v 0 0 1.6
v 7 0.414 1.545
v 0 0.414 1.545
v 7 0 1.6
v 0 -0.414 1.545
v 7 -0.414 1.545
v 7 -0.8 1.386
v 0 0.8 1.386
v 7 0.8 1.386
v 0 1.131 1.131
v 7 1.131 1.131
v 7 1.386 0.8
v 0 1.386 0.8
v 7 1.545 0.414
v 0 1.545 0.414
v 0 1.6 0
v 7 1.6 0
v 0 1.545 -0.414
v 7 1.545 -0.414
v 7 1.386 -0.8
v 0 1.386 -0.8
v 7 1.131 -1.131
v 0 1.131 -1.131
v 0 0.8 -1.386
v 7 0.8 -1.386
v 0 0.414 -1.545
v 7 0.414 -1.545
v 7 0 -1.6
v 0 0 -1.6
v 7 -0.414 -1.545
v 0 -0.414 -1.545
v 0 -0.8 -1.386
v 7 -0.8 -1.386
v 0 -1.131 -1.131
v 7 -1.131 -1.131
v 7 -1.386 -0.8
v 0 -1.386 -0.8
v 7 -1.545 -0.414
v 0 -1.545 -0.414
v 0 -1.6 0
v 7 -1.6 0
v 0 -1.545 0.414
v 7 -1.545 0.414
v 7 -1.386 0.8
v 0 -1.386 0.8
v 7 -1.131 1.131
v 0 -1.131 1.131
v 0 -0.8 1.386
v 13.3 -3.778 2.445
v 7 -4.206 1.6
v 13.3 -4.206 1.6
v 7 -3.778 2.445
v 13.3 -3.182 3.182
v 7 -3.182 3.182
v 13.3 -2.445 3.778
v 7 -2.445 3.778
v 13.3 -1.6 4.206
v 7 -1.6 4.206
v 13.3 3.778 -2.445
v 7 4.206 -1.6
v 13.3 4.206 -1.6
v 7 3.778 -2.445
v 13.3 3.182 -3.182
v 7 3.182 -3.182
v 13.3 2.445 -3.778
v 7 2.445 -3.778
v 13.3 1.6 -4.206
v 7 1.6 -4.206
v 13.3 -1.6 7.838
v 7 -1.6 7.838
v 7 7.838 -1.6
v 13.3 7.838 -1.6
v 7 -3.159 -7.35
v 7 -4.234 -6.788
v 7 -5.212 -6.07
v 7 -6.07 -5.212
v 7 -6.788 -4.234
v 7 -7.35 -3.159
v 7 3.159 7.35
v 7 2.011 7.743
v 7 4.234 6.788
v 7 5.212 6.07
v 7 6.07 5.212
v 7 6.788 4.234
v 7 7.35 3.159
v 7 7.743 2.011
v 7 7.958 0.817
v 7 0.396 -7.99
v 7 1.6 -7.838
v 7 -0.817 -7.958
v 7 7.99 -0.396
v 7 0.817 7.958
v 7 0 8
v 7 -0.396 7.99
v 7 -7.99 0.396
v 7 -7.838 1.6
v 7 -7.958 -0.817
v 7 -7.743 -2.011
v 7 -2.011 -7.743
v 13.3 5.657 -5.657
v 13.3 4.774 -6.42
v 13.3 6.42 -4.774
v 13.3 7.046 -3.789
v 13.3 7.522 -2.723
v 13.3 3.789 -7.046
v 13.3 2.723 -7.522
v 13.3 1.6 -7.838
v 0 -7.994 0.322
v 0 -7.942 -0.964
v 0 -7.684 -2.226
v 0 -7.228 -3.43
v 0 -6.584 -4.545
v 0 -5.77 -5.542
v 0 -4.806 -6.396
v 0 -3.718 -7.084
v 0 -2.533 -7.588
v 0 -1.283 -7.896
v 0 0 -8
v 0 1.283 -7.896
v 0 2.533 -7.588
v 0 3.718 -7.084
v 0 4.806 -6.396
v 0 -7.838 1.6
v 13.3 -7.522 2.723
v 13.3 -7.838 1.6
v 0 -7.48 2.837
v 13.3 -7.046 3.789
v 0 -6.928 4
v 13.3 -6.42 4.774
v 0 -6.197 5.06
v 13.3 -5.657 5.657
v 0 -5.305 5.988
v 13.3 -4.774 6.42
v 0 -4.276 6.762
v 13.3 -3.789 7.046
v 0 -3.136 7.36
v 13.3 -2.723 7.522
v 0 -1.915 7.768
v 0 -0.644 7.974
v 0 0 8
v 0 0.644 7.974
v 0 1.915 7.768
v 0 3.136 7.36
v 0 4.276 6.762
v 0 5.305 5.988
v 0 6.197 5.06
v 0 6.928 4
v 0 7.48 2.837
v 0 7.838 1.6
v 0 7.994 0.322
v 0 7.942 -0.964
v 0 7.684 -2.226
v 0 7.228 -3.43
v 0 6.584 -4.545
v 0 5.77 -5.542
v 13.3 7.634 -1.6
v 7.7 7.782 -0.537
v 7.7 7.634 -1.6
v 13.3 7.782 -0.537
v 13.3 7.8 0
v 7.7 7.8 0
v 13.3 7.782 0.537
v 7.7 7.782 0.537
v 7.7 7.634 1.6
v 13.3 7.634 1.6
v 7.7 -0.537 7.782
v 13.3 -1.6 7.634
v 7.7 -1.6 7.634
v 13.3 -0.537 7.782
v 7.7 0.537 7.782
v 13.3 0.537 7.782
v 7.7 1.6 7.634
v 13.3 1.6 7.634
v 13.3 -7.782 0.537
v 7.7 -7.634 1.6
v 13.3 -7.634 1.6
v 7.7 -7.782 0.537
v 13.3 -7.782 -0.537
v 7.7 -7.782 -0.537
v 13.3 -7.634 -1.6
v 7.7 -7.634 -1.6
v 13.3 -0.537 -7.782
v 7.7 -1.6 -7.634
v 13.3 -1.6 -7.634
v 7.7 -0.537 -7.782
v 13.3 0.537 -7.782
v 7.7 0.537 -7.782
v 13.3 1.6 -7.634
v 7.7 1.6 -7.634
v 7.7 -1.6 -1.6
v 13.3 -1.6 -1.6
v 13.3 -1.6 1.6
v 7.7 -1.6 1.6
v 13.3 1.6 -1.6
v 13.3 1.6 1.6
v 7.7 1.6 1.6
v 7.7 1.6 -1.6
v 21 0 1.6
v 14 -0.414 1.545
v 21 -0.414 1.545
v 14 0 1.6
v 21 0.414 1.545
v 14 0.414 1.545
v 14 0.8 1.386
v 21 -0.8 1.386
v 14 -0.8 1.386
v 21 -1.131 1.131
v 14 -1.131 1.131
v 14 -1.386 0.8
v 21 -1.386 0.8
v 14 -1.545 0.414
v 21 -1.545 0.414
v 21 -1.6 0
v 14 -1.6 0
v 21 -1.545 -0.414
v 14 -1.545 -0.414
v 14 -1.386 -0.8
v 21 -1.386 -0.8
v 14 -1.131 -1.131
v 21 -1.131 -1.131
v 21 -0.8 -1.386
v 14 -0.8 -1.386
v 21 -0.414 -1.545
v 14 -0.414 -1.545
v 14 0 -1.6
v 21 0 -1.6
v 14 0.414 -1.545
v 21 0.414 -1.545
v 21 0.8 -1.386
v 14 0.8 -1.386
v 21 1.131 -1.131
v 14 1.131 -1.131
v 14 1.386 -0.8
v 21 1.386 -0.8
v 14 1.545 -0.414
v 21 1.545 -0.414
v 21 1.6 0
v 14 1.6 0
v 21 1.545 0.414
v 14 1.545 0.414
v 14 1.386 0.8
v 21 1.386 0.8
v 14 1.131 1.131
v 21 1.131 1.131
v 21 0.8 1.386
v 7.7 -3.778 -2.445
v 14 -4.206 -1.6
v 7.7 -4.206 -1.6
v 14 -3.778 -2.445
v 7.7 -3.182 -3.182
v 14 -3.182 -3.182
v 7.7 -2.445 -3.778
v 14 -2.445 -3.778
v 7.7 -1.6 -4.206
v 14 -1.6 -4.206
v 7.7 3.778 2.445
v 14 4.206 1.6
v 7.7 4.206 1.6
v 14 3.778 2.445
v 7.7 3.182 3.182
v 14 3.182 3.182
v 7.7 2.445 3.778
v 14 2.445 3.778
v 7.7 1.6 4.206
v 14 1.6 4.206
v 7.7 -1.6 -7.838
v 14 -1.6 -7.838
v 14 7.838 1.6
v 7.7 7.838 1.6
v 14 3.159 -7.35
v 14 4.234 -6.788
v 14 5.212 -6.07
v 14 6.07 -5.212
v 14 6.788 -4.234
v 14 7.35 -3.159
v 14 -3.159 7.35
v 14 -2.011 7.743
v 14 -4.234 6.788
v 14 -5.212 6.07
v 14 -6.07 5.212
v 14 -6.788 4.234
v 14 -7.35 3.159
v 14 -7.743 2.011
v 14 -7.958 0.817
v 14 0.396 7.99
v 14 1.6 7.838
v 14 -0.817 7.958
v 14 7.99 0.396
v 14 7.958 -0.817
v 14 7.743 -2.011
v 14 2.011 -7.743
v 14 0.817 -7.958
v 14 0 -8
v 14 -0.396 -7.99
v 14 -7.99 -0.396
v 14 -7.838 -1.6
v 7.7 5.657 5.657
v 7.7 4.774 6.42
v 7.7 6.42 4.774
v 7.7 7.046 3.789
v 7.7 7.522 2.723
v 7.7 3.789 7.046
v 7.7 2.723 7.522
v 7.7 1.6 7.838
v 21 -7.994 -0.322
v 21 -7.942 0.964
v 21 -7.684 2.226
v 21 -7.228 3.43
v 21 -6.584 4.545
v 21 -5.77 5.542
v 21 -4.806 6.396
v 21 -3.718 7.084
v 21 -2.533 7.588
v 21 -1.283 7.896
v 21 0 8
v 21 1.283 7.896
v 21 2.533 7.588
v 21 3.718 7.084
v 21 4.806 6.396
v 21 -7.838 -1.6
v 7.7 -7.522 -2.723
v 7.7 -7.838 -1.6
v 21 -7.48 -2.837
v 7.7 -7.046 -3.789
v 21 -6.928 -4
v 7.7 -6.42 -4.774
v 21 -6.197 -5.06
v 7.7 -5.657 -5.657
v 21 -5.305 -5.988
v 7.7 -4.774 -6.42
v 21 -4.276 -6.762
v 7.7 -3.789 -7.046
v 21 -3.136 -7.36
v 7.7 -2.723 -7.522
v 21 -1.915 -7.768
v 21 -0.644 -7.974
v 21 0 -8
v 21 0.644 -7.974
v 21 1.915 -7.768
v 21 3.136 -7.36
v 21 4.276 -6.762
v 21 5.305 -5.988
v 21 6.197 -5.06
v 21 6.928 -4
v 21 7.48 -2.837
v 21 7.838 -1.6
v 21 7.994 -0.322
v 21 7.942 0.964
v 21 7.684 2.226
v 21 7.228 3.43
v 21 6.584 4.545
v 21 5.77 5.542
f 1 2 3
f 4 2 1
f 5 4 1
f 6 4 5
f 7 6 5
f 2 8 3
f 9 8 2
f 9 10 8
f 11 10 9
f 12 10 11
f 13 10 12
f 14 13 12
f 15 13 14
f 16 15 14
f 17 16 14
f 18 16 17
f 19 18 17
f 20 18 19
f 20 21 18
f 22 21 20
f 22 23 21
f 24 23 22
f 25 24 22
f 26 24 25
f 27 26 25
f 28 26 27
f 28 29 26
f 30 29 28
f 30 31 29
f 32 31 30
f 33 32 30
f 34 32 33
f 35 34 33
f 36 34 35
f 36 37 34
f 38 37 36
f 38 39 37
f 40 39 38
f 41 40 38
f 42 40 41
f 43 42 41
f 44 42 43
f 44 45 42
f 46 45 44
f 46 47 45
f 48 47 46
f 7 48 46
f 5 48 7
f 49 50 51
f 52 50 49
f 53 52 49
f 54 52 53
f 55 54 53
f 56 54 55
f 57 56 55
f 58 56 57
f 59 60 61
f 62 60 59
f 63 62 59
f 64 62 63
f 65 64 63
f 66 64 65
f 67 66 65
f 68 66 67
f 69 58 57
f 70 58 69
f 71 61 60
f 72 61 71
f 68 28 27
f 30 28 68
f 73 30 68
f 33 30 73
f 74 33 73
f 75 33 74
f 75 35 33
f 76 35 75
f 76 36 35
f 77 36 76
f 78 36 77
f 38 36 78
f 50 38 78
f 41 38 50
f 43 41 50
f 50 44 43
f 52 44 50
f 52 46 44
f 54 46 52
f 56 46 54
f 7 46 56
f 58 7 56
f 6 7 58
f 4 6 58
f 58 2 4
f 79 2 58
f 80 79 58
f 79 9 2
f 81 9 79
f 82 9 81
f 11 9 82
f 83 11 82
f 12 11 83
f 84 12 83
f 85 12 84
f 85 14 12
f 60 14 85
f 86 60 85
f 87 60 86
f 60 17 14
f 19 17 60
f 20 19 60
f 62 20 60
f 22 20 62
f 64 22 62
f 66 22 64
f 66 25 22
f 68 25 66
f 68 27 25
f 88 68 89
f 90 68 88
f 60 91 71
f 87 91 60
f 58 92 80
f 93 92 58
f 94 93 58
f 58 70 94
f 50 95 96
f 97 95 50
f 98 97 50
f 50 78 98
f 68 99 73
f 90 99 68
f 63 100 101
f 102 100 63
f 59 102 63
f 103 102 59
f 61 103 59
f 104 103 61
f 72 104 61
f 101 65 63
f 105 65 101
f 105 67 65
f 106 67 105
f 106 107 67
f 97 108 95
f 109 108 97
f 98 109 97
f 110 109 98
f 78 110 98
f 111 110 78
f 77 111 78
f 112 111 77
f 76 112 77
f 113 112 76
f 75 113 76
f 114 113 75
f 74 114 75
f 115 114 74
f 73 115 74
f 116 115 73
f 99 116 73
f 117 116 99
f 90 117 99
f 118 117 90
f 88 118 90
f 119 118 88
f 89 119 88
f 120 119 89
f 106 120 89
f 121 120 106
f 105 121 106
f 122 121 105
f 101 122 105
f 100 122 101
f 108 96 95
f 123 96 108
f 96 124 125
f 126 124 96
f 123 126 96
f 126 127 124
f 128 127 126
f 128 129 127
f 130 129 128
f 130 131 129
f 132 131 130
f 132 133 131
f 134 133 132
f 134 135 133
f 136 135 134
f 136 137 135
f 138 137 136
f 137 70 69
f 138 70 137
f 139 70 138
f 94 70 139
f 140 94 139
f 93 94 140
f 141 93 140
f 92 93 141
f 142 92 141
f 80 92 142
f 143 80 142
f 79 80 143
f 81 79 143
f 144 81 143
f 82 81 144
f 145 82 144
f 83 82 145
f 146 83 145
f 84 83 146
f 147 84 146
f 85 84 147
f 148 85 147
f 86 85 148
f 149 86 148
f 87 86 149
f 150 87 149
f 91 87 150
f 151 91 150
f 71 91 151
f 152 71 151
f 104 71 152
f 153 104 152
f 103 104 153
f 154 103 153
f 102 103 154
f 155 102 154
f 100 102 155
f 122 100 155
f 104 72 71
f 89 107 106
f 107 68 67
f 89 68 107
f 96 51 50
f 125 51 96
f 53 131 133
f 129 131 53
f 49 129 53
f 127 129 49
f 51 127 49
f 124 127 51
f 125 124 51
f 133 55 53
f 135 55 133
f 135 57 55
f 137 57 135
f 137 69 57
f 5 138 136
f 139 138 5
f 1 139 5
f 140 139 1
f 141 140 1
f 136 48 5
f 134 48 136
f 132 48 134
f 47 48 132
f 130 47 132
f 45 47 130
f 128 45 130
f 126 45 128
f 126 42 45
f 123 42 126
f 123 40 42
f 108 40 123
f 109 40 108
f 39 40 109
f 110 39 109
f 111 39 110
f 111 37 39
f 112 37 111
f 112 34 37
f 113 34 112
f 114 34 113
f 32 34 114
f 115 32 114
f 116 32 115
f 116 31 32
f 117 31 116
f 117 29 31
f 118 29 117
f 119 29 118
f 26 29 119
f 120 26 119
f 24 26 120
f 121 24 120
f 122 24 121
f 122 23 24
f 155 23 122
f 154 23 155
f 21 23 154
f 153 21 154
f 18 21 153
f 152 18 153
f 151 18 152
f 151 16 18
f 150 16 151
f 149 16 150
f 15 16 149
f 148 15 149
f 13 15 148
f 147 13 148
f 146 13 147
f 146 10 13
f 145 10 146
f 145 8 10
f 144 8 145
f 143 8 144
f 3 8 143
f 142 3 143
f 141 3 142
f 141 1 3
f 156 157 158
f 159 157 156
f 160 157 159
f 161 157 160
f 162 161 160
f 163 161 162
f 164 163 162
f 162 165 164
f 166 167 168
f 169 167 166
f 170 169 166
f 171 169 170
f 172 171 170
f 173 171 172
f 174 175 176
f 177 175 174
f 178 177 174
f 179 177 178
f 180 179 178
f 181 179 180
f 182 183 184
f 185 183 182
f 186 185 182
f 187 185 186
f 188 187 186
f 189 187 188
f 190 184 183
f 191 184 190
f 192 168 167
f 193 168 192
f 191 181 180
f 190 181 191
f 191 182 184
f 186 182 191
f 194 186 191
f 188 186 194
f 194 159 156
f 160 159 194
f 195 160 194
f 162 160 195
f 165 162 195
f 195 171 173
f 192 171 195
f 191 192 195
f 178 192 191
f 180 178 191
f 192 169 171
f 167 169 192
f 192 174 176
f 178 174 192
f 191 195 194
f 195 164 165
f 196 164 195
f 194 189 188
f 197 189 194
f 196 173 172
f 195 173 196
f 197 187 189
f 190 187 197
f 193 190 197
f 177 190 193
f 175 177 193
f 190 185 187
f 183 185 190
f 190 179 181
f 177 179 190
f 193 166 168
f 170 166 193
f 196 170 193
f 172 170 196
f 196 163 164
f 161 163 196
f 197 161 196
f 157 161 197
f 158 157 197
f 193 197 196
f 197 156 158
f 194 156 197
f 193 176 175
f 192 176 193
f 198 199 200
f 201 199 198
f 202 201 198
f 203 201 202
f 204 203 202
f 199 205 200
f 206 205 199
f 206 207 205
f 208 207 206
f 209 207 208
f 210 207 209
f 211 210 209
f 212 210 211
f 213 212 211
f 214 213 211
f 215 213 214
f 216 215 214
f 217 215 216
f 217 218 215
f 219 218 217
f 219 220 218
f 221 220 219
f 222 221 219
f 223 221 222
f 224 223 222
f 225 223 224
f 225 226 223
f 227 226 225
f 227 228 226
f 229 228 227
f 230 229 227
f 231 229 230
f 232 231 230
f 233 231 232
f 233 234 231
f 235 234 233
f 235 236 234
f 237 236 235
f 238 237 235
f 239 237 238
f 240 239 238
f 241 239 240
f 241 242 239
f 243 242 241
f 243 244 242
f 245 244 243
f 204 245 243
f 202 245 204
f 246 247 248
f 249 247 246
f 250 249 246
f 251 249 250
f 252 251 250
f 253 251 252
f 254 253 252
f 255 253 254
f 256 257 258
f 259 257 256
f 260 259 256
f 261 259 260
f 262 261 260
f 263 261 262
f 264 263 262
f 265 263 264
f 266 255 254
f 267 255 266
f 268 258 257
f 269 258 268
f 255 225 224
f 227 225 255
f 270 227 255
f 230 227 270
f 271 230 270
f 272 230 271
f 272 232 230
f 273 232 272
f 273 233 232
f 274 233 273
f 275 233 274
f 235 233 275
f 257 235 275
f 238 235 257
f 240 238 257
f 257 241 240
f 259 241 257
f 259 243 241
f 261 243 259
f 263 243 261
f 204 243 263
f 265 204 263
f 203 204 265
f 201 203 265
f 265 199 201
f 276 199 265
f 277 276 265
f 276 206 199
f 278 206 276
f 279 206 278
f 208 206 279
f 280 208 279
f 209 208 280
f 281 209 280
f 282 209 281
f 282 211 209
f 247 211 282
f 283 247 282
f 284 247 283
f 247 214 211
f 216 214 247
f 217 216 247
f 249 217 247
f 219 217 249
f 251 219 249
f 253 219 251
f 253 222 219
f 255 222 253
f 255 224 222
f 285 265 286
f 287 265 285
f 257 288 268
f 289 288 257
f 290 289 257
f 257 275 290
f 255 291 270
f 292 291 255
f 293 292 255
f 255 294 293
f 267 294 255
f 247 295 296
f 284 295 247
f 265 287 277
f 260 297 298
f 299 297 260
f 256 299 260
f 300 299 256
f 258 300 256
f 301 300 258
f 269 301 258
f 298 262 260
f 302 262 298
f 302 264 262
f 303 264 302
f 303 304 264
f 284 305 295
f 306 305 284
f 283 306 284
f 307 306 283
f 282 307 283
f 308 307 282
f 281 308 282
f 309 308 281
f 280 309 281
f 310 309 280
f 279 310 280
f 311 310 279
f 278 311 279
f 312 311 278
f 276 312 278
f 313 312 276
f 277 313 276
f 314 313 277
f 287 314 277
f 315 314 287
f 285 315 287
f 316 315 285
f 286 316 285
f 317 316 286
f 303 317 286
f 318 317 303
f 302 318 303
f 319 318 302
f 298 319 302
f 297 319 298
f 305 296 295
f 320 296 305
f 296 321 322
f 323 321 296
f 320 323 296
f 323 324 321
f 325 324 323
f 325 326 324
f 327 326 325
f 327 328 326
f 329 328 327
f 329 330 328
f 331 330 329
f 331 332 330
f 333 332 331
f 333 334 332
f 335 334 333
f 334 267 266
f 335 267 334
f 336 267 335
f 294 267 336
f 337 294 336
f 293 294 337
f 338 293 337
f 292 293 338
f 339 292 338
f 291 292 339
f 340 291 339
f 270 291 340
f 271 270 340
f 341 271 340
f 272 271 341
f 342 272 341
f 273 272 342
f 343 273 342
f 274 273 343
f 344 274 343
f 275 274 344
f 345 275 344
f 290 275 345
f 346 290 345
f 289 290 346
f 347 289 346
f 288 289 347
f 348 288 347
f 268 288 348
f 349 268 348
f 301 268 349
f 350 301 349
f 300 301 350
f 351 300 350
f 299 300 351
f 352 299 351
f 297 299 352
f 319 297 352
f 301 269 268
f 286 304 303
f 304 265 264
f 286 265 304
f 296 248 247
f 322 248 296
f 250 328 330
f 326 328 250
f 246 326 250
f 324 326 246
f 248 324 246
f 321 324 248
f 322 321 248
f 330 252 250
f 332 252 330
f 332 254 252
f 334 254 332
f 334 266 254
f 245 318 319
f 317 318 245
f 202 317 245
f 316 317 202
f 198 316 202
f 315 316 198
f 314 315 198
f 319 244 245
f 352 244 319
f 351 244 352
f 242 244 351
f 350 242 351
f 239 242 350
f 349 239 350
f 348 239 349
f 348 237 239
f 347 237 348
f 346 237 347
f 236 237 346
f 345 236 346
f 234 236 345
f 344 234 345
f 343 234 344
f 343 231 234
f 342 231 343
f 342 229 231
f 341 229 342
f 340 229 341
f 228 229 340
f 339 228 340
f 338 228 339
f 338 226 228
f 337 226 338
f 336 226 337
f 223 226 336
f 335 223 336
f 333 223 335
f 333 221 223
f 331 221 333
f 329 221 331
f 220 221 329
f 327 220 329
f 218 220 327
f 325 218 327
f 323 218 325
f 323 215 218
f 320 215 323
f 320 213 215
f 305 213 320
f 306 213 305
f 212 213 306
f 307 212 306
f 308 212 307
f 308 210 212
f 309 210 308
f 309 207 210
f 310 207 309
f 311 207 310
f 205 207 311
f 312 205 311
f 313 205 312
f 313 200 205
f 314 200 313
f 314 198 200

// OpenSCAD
polyhedron(

points=[[0.0, 0.414, 1.545], [7.0, 0.414, 1.545], [0.0, 0.0, 1.6], [7.0, 0.0, 1.6], [0.0, -0.414, 1.545], [7.0, -0.414, 1.545], [7.0, -0.8, 1.386], [0.0, 0.8, 1.386], [7.0, 0.8, 1.386], [0.0, 1.131, 1.131], [7.0, 1.131, 1.131], [7.0, 1.386, 0.8], [0.0, 1.386, 0.8], [7.0, 1.545, 0.414], [0.0, 1.545, 0.414], [0.0, 1.6, 0.0], [7.0, 1.6, 0.0], [0.0, 1.545, -0.414], [7.0, 1.545, -0.414], [7.0, 1.386, -0.8], [0.0, 1.386, -0.8], [7.0, 1.131, -1.131], [0.0, 1.131, -1.131], [0.0, 0.8, -1.386], [7.0, 0.8, -1.386], [0.0, 0.414, -1.545], [7.0, 0.414, -1.545], [7.0, 0.0, -1.6], [0.0, 0.0, -1.6], [7.0, -0.414, -1.545], [0.0, -0.414, -1.545], [0.0, -0.8, -1.386], [7.0, -0.8, -1.386], [0.0, -1.131, -1.131], [7.0, -1.131, -1.131], [7.0, -1.386, -0.8], [0.0, -1.386, -0.8], [7.0, -1.545, -0.414], [0.0, -1.545, -0.414], [0.0, -1.6, 0.0], [7.0, -1.6, 0.0], [0.0, -1.545, 0.414], [7.0, -1.545, 0.414], [7.0, -1.386, 0.8], [0.0, -1.386, 0.8], [7.0, -1.131, 1.131], [0.0, -1.131, 1.131], [0.0, -0.8, 1.386], [13.3, -4.206, 1.6], [7.0, -4.206, 1.6], [13.3, -3.778, 2.445], [7.0, -3.778, 2.445], [13.3, -3.182, 3.182], [7.0, -3.182, 3.182], [13.3, -2.445, 3.778], [7.0, -2.445, 3.778], [13.3, -1.6, 4.206], [7.0, -1.6, 4.206], [13.3, 4.206, -1.6], [7.0, 4.206, -1.6], [13.3, 3.778, -2.445], [7.0, 3.778, -2.445], [13.3, 3.182, -3.182], [7.0, 3.182, -3.182], [13.3, 2.445, -3.778], [7.0, 2.445, -3.778], [13.3, 1.6, -4.206], [7.0, 1.6, -4.206], [13.3, -1.6, 7.838], [7.0, -1.6, 7.838], [7.0, 7.838, -1.6], [13.3, 7.838, -1.6], [7.0, -3.159, -7.35], [7.0, -4.234, -6.788], [7.0, -5.212, -6.07], [7.0, -6.07, -5.212], [7.0, -6.788, -4.234], [7.0, -7.35, -3.159], [7.0, 3.159, 7.35], [7.0, 2.011, 7.743], [7.0, 4.234, 6.788], [7.0, 5.212, 6.07], [7.0, 6.07, 5.212], [7.0, 6.788, 4.234], [7.0, 7.35, 3.159], [7.0, 7.743, 2.011], [7.0, 7.958, 0.817], [7.0, 1.6, -7.838], [7.0, 0.396, -7.99], [7.0, -0.817, -7.958], [7.0, 7.99, -0.396], [7.0, 0.817, 7.958], [7.0, 0.0, 8.0], [7.0, -0.396, 7.99], [7.0, -7.838, 1.6], [7.0, -7.99, 0.396], [7.0, -7.958, -0.817], [7.0, -7.743, -2.011], [7.0, -2.011, -7.743], [13.3, 4.774, -6.42], [13.3, 5.657, -5.657], [13.3, 6.42, -4.774], [13.3, 7.046, -3.789], [13.3, 7.522, -2.723], [13.3, 3.789, -7.046], [13.3, 2.723, -7.522], [13.3, 1.6, -7.838], [0.0, -7.994, 0.322], [0.0, -7.942, -0.964], [0.0, -7.684, -2.226], [0.0, -7.228, -3.43], [0.0, -6.584, -4.545], [0.0, -5.77, -5.542], [0.0, -4.806, -6.396], [0.0, -3.718, -7.084], [0.0, -2.533, -7.588], [0.0, -1.283, -7.896], [0.0, 0.0, -8.0], [0.0, 1.283, -7.896], [0.0, 2.533, -7.588], [0.0, 3.718, -7.084], [0.0, 4.806, -6.396], [0.0, -7.838, 1.6], [13.3, -7.838, 1.6], [13.3, -7.522, 2.723], [0.0, -7.48, 2.837], [13.3, -7.046, 3.789], [0.0, -6.928, 4.0], [13.3, -6.42, 4.774], [0.0, -6.197, 5.06], [13.3, -5.657, 5.657], [0.0, -5.305, 5.988], [13.3, -4.774, 6.42], [0.0, -4.276, 6.762], [13.3, -3.789, 7.046], [0.0, -3.136, 7.36], [13.3, -2.723, 7.522], [0.0, -1.915, 7.768], [0.0, -0.644, 7.974], [0.0, 0.0, 8.0], [0.0, 0.644, 7.974], [0.0, 1.915, 7.768], [0.0, 3.136, 7.36], [0.0, 4.276, 6.762], [0.0, 5.305, 5.988], [0.0, 6.197, 5.06], [0.0, 6.928, 4.0], [0.0, 7.48, 2.837], [0.0, 7.838, 1.6], [0.0, 7.994, 0.322], [0.0, 7.942, -0.964], [0.0, 7.684, -2.226], [0.0, 7.228, -3.43], [0.0, 6.584, -4.545], [0.0, 5.77, -5.542], [7.7, 7.634, -1.6], [7.7, 7.782, -0.537], [13.3, 7.634, -1.6], [13.3, 7.782, -0.537], [13.3, 7.8, 0.0], [7.7, 7.8, 0.0], [13.3, 7.782, 0.537], [7.7, 7.782, 0.537], [7.7, 7.634, 1.6], [13.3, 7.634, 1.6], [7.7, -1.6, 7.634], [13.3, -1.6, 7.634], [7.7, -0.537, 7.782], [13.3, -0.537, 7.782], [7.7, 0.537, 7.782], [13.3, 0.537, 7.782], [7.7, 1.6, 7.634], [13.3, 1.6, 7.634], [13.3, -7.634, 1.6], [7.7, -7.634, 1.6], [13.3, -7.782, 0.537], [7.7, -7.782, 0.537], [13.3, -7.782, -0.537], [7.7, -7.782, -0.537], [13.3, -7.634, -1.6], [7.7, -7.634, -1.6], [13.3, -1.6, -7.634], [7.7, -1.6, -7.634], [13.3, -0.537, -7.782], [7.7, -0.537, -7.782], [13.3, 0.537, -7.782], [7.7, 0.537, -7.782], [13.3, 1.6, -7.634], [7.7, 1.6, -7.634], [7.7, -1.6, -1.6], [13.3, -1.6, -1.6], [13.3, -1.6, 1.6], [7.7, -1.6, 1.6], [13.3, 1.6, -1.6], [13.3, 1.6, 1.6], [7.7, 1.6, 1.6], [7.7, 1.6, -1.6], [21.0, -0.414, 1.545], [14.0, -0.414, 1.545], [21.0, 0.0, 1.6], [14.0, 0.0, 1.6], [21.0, 0.414, 1.545], [14.0, 0.414, 1.545], [14.0, 0.8, 1.386], [21.0, -0.8, 1.386], [14.0, -0.8, 1.386], [21.0, -1.131, 1.131], [14.0, -1.131, 1.131], [14.0, -1.386, 0.8], [21.0, -1.386, 0.8], [14.0, -1.545, 0.414], [21.0, -1.545, 0.414], [21.0, -1.6, 0.0], [14.0, -1.6, 0.0], [21.0, -1.545, -0.414], [14.0, -1.545, -0.414], [14.0, -1.386, -0.8], [21.0, -1.386, -0.8], [14.0, -1.131, -1.131], [21.0, -1.131, -1.131], [21.0, -0.8, -1.386], [14.0, -0.8, -1.386], [21.0, -0.414, -1.545], [14.0, -0.414, -1.545], [14.0, 0.0, -1.6], [21.0, 0.0, -1.6], [14.0, 0.414, -1.545], [21.0, 0.414, -1.545], [21.0, 0.8, -1.386], [14.0, 0.8, -1.386], [21.0, 1.131, -1.131], [14.0, 1.131, -1.131], [14.0, 1.386, -0.8], [21.0, 1.386, -0.8], [14.0, 1.545, -0.414], [21.0, 1.545, -0.414], [21.0, 1.6, 0.0], [14.0, 1.6, 0.0], [21.0, 1.545, 0.414], [14.0, 1.545, 0.414], [14.0, 1.386, 0.8], [21.0, 1.386, 0.8], [14.0, 1.131, 1.131], [21.0, 1.131, 1.131], [21.0, 0.8, 1.386], [7.7, -4.206, -1.6], [14.0, -4.206, -1.6], [7.7, -3.778, -2.445], [14.0, -3.778, -2.445], [7.7, -3.182, -3.182], [14.0, -3.182, -3.182], [7.7, -2.445, -3.778], [14.0, -2.445, -3.778], [7.7, -1.6, -4.206], [14.0, -1.6, -4.206], [7.7, 4.206, 1.6], [14.0, 4.206, 1.6], [7.7, 3.778, 2.445], [14.0, 3.778, 2.445], [7.7, 3.182, 3.182], [14.0, 3.182, 3.182], [7.7, 2.445, 3.778], [14.0, 2.445, 3.778], [7.7, 1.6, 4.206], [14.0, 1.6, 4.206], [7.7, -1.6, -7.838], [14.0, -1.6, -7.838], [14.0, 7.838, 1.6], [7.7, 7.838, 1.6], [14.0, 3.159, -7.35], [14.0, 4.234, -6.788], [14.0, 5.212, -6.07], [14.0, 6.07, -5.212], [14.0, 6.788, -4.234], [14.0, 7.35, -3.159], [14.0, -3.159, 7.35], [14.0, -2.011, 7.743], [14.0, -4.234, 6.788], [14.0, -5.212, 6.07], [14.0, -6.07, 5.212], [14.0, -6.788, 4.234], [14.0, -7.35, 3.159], [14.0, -7.743, 2.011], [14.0, -7.958, 0.817], [14.0, 1.6, 7.838], [14.0, 0.396, 7.99], [14.0, -0.817, 7.958], [14.0, 7.99, 0.396], [14.0, 7.958, -0.817], [14.0, 7.743, -2.011], [14.0, 2.011, -7.743], [14.0, 0.817, -7.958], [14.0, 0.0, -8.0], [14.0, -0.396, -7.99], [14.0, -7.838, -1.6], [14.0, -7.99, -0.396], [7.7, 4.774, 6.42], [7.7, 5.657, 5.657], [7.7, 6.42, 4.774], [7.7, 7.046, 3.789], [7.7, 7.522, 2.723], [7.7, 3.789, 7.046], [7.7, 2.723, 7.522], [7.7, 1.6, 7.838], [21.0, -7.994, -0.322], [21.0, -7.942, 0.964], [21.0, -7.684, 2.226], [21.0, -7.228, 3.43], [21.0, -6.584, 4.545], [21.0, -5.77, 5.542], [21.0, -4.806, 6.396], [21.0, -3.718, 7.084], [21.0, -2.533, 7.588], [21.0, -1.283, 7.896], [21.0, 0.0, 8.0], [21.0, 1.283, 7.896], [21.0, 2.533, 7.588], [21.0, 3.718, 7.084], [21.0, 4.806, 6.396], [21.0, -7.838, -1.6], [7.7, -7.838, -1.6], [7.7, -7.522, -2.723], [21.0, -7.48, -2.837], [7.7, -7.046, -3.789], [21.0, -6.928, -4.0], [7.7, -6.42, -4.774], [21.0, -6.197, -5.06], [7.7, -5.657, -5.657], [21.0, -5.305, -5.988], [7.7, -4.774, -6.42], [21.0, -4.276, -6.762], [7.7, -3.789, -7.046], [21.0, -3.136, -7.36], [7.7, -2.723, -7.522], [21.0, -1.915, -7.768], [21.0, -0.644, -7.974], [21.0, 0.0, -8.0], [21.0, 0.644, -7.974], [21.0, 1.915, -7.768], [21.0, 3.136, -7.36], [21.0, 4.276, -6.762], [21.0, 5.305, -5.988], [21.0, 6.197, -5.06], [21.0, 6.928, -4.0], [21.0, 7.48, -2.837], [21.0, 7.838, -1.6], [21.0, 7.994, -0.322], [21.0, 7.942, 0.964], [21.0, 7.684, 2.226], [21.0, 7.228, 3.43], [21.0, 6.584, 4.545], [21.0, 5.77, 5.542]],

faces=[[0, 1, 2], [2, 1, 3], [2, 3, 4], [4, 3, 5], [4, 5, 6], [0, 7, 1], [1, 7, 8], [7, 9, 8], [8, 9, 10], [10, 9, 11], [11, 9, 12], [11, 12, 13], [13, 12, 14], [13, 14, 15], [13, 15, 16], [16, 15, 17], [16, 17, 18], [18, 17, 19], [17, 20, 19], [19, 20, 21], [20, 22, 21], [21, 22, 23], [21, 23, 24], [24, 23, 25], [24, 25, 26], [26, 25, 27], [25, 28, 27], [27, 28, 29], [28, 30, 29], [29, 30, 31], [29, 31, 32], [32, 31, 33], [32, 33, 34], [34, 33, 35], [33, 36, 35], [35, 36, 37], [36, 38, 37], [37, 38, 39], [37, 39, 40], [40, 39, 41], [40, 41, 42], [42, 41, 43], [41, 44, 43], [43, 44, 45], [44, 46, 45], [45, 46, 47], [45, 47, 6], [6, 47, 4], [48, 49, 50], [50, 49, 51], [50, 51, 52], [52, 51, 53], [52, 53, 54], [54, 53, 55], [54, 55, 56], [56, 55, 57], [58, 59, 60], [60, 59, 61], [60, 61, 62], [62, 61, 63], [62, 63, 64], [64, 63, 65], [64, 65, 66], [66, 65, 67], [56, 57, 68], [68, 57, 69], [59, 58, 70], [70, 58, 71], [26, 27, 67], [67, 27, 29], [67, 29, 72], [72, 29, 32], [72, 32, 73], [73, 32, 74], [32, 34, 74], [74, 34, 75], [34, 35, 75], [75, 35, 76], [76, 35, 77], [77, 35, 37], [77, 37, 49], [49, 37, 40], [49, 40, 42], [42, 43, 49], [49, 43, 51], [43, 45, 51], [51, 45, 53], [53, 45, 55], [55, 45, 6], [55, 6, 57], [57, 6, 5], [57, 5, 3], [3, 1, 57], [57, 1, 78], [57, 78, 79], [1, 8, 78], [78, 8, 80], [80, 8, 81], [81, 8, 10], [81, 10, 82], [82, 10, 11], [82, 11, 83], [83, 11, 84], [11, 13, 84], [84, 13, 59], [84, 59, 85], [85, 59, 86], [13, 16, 59], [59, 16, 18], [59, 18, 19], [59, 19, 61], [61, 19, 21], [61, 21, 63], [63, 21, 65], [21, 24, 65], [65, 24, 67], [24, 26, 67], [87, 67, 88], [88, 67, 89], [70, 90, 59], [59, 90, 86], [79, 91, 57], [57, 91, 92], [57, 92, 93], [93, 69, 57], [94, 95, 49], [49, 95, 96], [49, 96, 97], [97, 77, 49], [72, 98, 67], [67, 98, 89], [99, 100, 62], [62, 100, 101], [62, 101, 60], [60, 101, 102], [60, 102, 58], [58, 102, 103], [58, 103, 71], [62, 64, 99], [99, 64, 104], [64, 66, 104], [104, 66, 105], [66, 106, 105], [95, 107, 96], [96, 107, 108], [96, 108, 97], [97, 108, 109], [97, 109, 77], [77, 109, 110], [77, 110, 76], [76, 110, 111], [76, 111, 75], [75, 111, 112], [75, 112, 74], [74, 112, 113], [74, 113, 73], [73, 113, 114], [73, 114, 72], [72, 114, 115], [72, 115, 98], [98, 115, 116], [98, 116, 89], [89, 116, 117], [89, 117, 88], [88, 117, 118], [88, 118, 87], [87, 118, 119], [87, 119, 105], [105, 119, 120], [105, 120, 104], [104, 120, 121], [104, 121, 99], [99, 121, 100], [95, 94, 107], [107, 94, 122], [123, 124, 94], [94, 124, 125], [94, 125, 122], [124, 126, 125], [125, 126, 127], [126, 128, 127], [127, 128, 129], [128, 130, 129], [129, 130, 131], [130, 132, 131], [131, 132, 133], [132, 134, 133], [133, 134, 135], [134, 136, 135], [135, 136, 137], [68, 69, 136], [136, 69, 137], [137, 69, 138], [138, 69, 93], [138, 93, 139], [139, 93, 92], [139, 92, 140], [140, 92, 91], [140, 91, 141], [141, 91, 79], [141, 79, 142], [142, 79, 78], [142, 78, 80], [142, 80, 143], [143, 80, 81], [143, 81, 144], [144, 81, 82], [144, 82, 145], [145, 82, 83], [145, 83, 146], [146, 83, 84], [146, 84, 147], [147, 84, 85], [147, 85, 148], [148, 85, 86], [148, 86, 149], [149, 86, 90], [149, 90, 150], [150, 90, 70], [150, 70, 151], [151, 70, 103], [151, 103, 152], [152, 103, 102], [152, 102, 153], [153, 102, 101], [153, 101, 154], [154, 101, 100], [154, 100, 121], [70, 71, 103], [105, 106, 87], [66, 67, 106], [106, 67, 87], [49, 48, 94], [94, 48, 123], [132, 130, 52], [52, 130, 128], [52, 128, 50], [50, 128, 126], [50, 126, 48], [48, 126, 124], [48, 124, 123], [52, 54, 132], [132, 54, 134], [54, 56, 134], [134, 56, 136], [56, 68, 136], [135, 137, 4], [4, 137, 138], [4, 138, 2], [2, 138, 139], [2, 139, 140], [4, 47, 135], [135, 47, 133], [133, 47, 131], [131, 47, 46], [131, 46, 129], [129, 46, 44], [129, 44, 127], [127, 44, 125], [44, 41, 125], [125, 41, 122], [41, 39, 122], [122, 39, 107], [107, 39, 108], [108, 39, 38], [108, 38, 109], [109, 38, 110], [38, 36, 110], [110, 36, 111], [36, 33, 111], [111, 33, 112], [112, 33, 113], [113, 33, 31], [113, 31, 114], [114, 31, 115], [31, 30, 115], [115, 30, 116], [30, 28, 116], [116, 28, 117], [117, 28, 118], [118, 28, 25], [118, 25, 119], [119, 25, 23], [119, 23, 120], [120, 23, 121], [23, 22, 121], [121, 22, 154], [154, 22, 153], [153, 22, 20], [153, 20, 152], [152, 20, 17], [152, 17, 151], [151, 17, 150], [17, 15, 150], [150, 15, 149], [149, 15, 148], [148, 15, 14], [148, 14, 147], [147, 14, 12], [147, 12, 146], [146, 12, 145], [12, 9, 145], [145, 9, 144], [9, 7, 144], [144, 7, 143], [143, 7, 142], [142, 7, 0], [142, 0, 141], [141, 0, 140], [0, 2, 140], [155, 156, 157], [157, 156, 158], [158, 156, 159], [159, 156, 160], [159, 160, 161], [161, 160, 162], [161, 162, 163], [163, 164, 161], [165, 166, 167], [167, 166, 168], [167, 168, 169], [169, 168, 170], [169, 170, 171], [171, 170, 172], [173, 174, 175], [175, 174, 176], [175, 176, 177], [177, 176, 178], [177, 178, 179], [179, 178, 180], [181, 182, 183], [183, 182, 184], [183, 184, 185], [185, 184, 186], [185, 186, 187], [187, 186, 188], [182, 181, 189], [189, 181, 190], [166, 165, 191], [191, 165, 192], [179, 180, 190], [190, 180, 189], [181, 183, 190], [190, 183, 185], [190, 185, 193], [193, 185, 187], [157, 158, 193], [193, 158, 159], [193, 159, 194], [194, 159, 161], [194, 161, 164], [172, 170, 194], [194, 170, 191], [194, 191, 190], [190, 191, 177], [190, 177, 179], [170, 168, 191], [191, 168, 166], [173, 175, 191], [191, 175, 177], [193, 194, 190], [164, 163, 194], [194, 163, 195], [187, 188, 193], [193, 188, 196], [171, 172, 195], [195, 172, 194], [188, 186, 196], [196, 186, 189], [196, 189, 192], [192, 189, 176], [192, 176, 174], [186, 184, 189], [189, 184, 182], [180, 178, 189], [189, 178, 176], [165, 167, 192], [192, 167, 169], [192, 169, 195], [195, 169, 171], [163, 162, 195], [195, 162, 160], [195, 160, 196], [196, 160, 156], [196, 156, 155], [195, 196, 192], [155, 157, 196], [196, 157, 193], [174, 173, 192], [192, 173, 191], [197, 198, 199], [199, 198, 200], [199, 200, 201], [201, 200, 202], [201, 202, 203], [197, 204, 198], [198, 204, 205], [204, 206, 205], [205, 206, 207], [207, 206, 208], [208, 206, 209], [208, 209, 210], [210, 209, 211], [210, 211, 212], [210, 212, 213], [213, 212, 214], [213, 214, 215], [215, 214, 216], [214, 217, 216], [216, 217, 218], [217, 219, 218], [218, 219, 220], [218, 220, 221], [221, 220, 222], [221, 222, 223], [223, 222, 224], [222, 225, 224], [224, 225, 226], [225, 227, 226], [226, 227, 228], [226, 228, 229], [229, 228, 230], [229, 230, 231], [231, 230, 232], [230, 233, 232], [232, 233, 234], [233, 235, 234], [234, 235, 236], [234, 236, 237], [237, 236, 238], [237, 238, 239], [239, 238, 240], [238, 241, 240], [240, 241, 242], [241, 243, 242], [242, 243, 244], [242, 244, 203], [203, 244, 201], [245, 246, 247], [247, 246, 248], [247, 248, 249], [249, 248, 250], [249, 250, 251], [251, 250, 252], [251, 252, 253], [253, 252, 254], [255, 256, 257], [257, 256, 258], [257, 258, 259], [259, 258, 260], [259, 260, 261], [261, 260, 262], [261, 262, 263], [263, 262, 264], [253, 254, 265], [265, 254, 266], [256, 255, 267], [267, 255, 268], [223, 224, 254], [254, 224, 226], [254, 226, 269], [269, 226, 229], [269, 229, 270], [270, 229, 271], [229, 231, 271], [271, 231, 272], [231, 232, 272], [272, 232, 273], [273, 232, 274], [274, 232, 234], [274, 234, 256], [256, 234, 237], [256, 237, 239], [239, 240, 256], [256, 240, 258], [240, 242, 258], [258, 242, 260], [260, 242, 262], [262, 242, 203], [262, 203, 264], [264, 203, 202], [264, 202, 200], [200, 198, 264], [264, 198, 275], [264, 275, 276], [198, 205, 275], [275, 205, 277], [277, 205, 278], [278, 205, 207], [278, 207, 279], [279, 207, 208], [279, 208, 280], [280, 208, 281], [208, 210, 281], [281, 210, 246], [281, 246, 282], [282, 246, 283], [210, 213, 246], [246, 213, 215], [246, 215, 216], [246, 216, 248], [248, 216, 218], [248, 218, 250], [250, 218, 252], [218, 221, 252], [252, 221, 254], [221, 223, 254], [284, 264, 285], [285, 264, 286], [267, 287, 256], [256, 287, 288], [256, 288, 289], [289, 274, 256], [269, 290, 254], [254, 290, 291], [254, 291, 292], [292, 293, 254], [254, 293, 266], [294, 295, 246], [246, 295, 283], [276, 286, 264], [296, 297, 259], [259, 297, 298], [259, 298, 257], [257, 298, 299], [257, 299, 255], [255, 299, 300], [255, 300, 268], [259, 261, 296], [296, 261, 301], [261, 263, 301], [301, 263, 302], [263, 303, 302], [295, 304, 283], [283, 304, 305], [283, 305, 282], [282, 305, 306], [282, 306, 281], [281, 306, 307], [281, 307, 280], [280, 307, 308], [280, 308, 279], [279, 308, 309], [279, 309, 278], [278, 309, 310], [278, 310, 277], [277, 310, 311], [277, 311, 275], [275, 311, 312], [275, 312, 276], [276, 312, 313], [276, 313, 286], [286, 313, 314], [286, 314, 285], [285, 314, 315], [285, 315, 284], [284, 315, 316], [284, 316, 302], [302, 316, 317], [302, 317, 301], [301, 317, 318], [301, 318, 296], [296, 318, 297], [295, 294, 304], [304, 294, 319], [320, 321, 294], [294, 321, 322], [294, 322, 319], [321, 323, 322], [322, 323, 324], [323, 325, 324], [324, 325, 326], [325, 327, 326], [326, 327, 328], [327, 329, 328], [328, 329, 330], [329, 331, 330], [330, 331, 332], [331, 333, 332], [332, 333, 334], [265, 266, 333], [333, 266, 334], [334, 266, 335], [335, 266, 293], [335, 293, 336], [336, 293, 292], [336, 292, 337], [337, 292, 291], [337, 291, 338], [338, 291, 290], [338, 290, 339], [339, 290, 269], [339, 269, 270], [339, 270, 340], [340, 270, 271], [340, 271, 341], [341, 271, 272], [341, 272, 342], [342, 272, 273], [342, 273, 343], [343, 273, 274], [343, 274, 344], [344, 274, 289], [344, 289, 345], [345, 289, 288], [345, 288, 346], [346, 288, 287], [346, 287, 347], [347, 287, 267], [347, 267, 348], [348, 267, 300], [348, 300, 349], [349, 300, 299], [349, 299, 350], [350, 299, 298], [350, 298, 351], [351, 298, 297], [351, 297, 318], [267, 268, 300], [302, 303, 284], [263, 264, 303], [303, 264, 284], [246, 245, 294], [294, 245, 320], [329, 327, 249], [249, 327, 325], [249, 325, 247], [247, 325, 323], [247, 323, 245], [245, 323, 321], [245, 321, 320], [249, 251, 329], [329, 251, 331], [251, 253, 331], [331, 253, 333], [253, 265, 333], [318, 317, 244], [244, 317, 316], [244, 316, 201], [201, 316, 315], [201, 315, 199], [199, 315, 314], [199, 314, 313], [244, 243, 318], [318, 243, 351], [351, 243, 350], [350, 243, 241], [350, 241, 349], [349, 241, 238], [349, 238, 348], [348, 238, 347], [238, 236, 347], [347, 236, 346], [346, 236, 345], [345, 236, 235], [345, 235, 344], [344, 235, 233], [344, 233, 343], [343, 233, 342], [233, 230, 342], [342, 230, 341], [230, 228, 341], [341, 228, 340], [340, 228, 339], [339, 228, 227], [339, 227, 338], [338, 227, 337], [227, 225, 337], [337, 225, 336], [336, 225, 335], [335, 225, 222], [335, 222, 334], [334, 222, 332], [222, 220, 332], [332, 220, 330], [330, 220, 328], [328, 220, 219], [328, 219, 326], [326, 219, 217], [326, 217, 324], [324, 217, 322], [217, 214, 322], [322, 214, 319], [214, 212, 319], [319, 212, 304], [304, 212, 305], [305, 212, 211], [305, 211, 306], [306, 211, 307], [211, 209, 307], [307, 209, 308], [209, 206, 308], [308, 206, 309], [309, 206, 310], [310, 206, 204], [310, 204, 311], [311, 204, 312], [204, 197, 312], [312, 197, 313], [197, 199, 313]]
);
